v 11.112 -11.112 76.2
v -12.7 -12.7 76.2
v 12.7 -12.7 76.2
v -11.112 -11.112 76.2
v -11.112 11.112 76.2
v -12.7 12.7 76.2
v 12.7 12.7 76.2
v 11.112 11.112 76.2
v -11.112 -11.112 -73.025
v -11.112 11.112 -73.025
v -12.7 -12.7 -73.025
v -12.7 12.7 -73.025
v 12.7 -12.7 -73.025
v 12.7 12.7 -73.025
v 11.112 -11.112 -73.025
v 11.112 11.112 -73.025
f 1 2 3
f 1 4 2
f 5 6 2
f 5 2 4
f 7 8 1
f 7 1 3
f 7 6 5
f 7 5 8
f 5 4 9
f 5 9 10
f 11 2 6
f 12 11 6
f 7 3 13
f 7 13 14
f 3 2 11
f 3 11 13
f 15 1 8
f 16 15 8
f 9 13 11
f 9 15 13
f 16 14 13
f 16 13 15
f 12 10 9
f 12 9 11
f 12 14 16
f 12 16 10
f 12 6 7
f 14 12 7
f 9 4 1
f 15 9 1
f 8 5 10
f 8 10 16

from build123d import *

# Parameters (mm, degrees)
SKETCH3_W                = 25.4
SKETCH3_H                = 25.4
SKETCH3_W_2              = 22.225
SKETCH3_H_2              = 22.225
BOSS_EXTRUDE1_DEPTH      = 76.2
BOSS_EXTRUDE1_DEPTH_BACK = 76.2
SKETCH4_W                = 25.4
SKETCH4_H                = 25.4
SKETCH4_W_2              = 22.225
SKETCH4_H_2              = 22.225
CUT_EXTRUDE1_DEPTH       = 3.175


with BuildPart() as part:
    # Sketch3 → Boss-Extrude1 (new body, two sides)
    with BuildSketch(Plane.XY) as boss_extrude1_sk:
        Rectangle(SKETCH3_W, SKETCH3_H)
        Rectangle(SKETCH3_W_2, SKETCH3_H_2, mode=Mode.SUBTRACT)
    extrude(amount=BOSS_EXTRUDE1_DEPTH)
    extrude(boss_extrude1_sk.sketch, amount=-BOSS_EXTRUDE1_DEPTH_BACK)

    # Sketch4 → Cut-Extrude1 (cut)
    with BuildSketch(Plane(origin=(0, 0, -76.2), x_dir=(-1, 0, 0), z_dir=(0, 0, -1))):
        Rectangle(SKETCH4_W, SKETCH4_H)
        Rectangle(SKETCH4_W_2, SKETCH4_H_2, mode=Mode.SUBTRACT)
    extrude(amount=-CUT_EXTRUDE1_DEPTH, mode=Mode.SUBTRACT)


solid = part.part
